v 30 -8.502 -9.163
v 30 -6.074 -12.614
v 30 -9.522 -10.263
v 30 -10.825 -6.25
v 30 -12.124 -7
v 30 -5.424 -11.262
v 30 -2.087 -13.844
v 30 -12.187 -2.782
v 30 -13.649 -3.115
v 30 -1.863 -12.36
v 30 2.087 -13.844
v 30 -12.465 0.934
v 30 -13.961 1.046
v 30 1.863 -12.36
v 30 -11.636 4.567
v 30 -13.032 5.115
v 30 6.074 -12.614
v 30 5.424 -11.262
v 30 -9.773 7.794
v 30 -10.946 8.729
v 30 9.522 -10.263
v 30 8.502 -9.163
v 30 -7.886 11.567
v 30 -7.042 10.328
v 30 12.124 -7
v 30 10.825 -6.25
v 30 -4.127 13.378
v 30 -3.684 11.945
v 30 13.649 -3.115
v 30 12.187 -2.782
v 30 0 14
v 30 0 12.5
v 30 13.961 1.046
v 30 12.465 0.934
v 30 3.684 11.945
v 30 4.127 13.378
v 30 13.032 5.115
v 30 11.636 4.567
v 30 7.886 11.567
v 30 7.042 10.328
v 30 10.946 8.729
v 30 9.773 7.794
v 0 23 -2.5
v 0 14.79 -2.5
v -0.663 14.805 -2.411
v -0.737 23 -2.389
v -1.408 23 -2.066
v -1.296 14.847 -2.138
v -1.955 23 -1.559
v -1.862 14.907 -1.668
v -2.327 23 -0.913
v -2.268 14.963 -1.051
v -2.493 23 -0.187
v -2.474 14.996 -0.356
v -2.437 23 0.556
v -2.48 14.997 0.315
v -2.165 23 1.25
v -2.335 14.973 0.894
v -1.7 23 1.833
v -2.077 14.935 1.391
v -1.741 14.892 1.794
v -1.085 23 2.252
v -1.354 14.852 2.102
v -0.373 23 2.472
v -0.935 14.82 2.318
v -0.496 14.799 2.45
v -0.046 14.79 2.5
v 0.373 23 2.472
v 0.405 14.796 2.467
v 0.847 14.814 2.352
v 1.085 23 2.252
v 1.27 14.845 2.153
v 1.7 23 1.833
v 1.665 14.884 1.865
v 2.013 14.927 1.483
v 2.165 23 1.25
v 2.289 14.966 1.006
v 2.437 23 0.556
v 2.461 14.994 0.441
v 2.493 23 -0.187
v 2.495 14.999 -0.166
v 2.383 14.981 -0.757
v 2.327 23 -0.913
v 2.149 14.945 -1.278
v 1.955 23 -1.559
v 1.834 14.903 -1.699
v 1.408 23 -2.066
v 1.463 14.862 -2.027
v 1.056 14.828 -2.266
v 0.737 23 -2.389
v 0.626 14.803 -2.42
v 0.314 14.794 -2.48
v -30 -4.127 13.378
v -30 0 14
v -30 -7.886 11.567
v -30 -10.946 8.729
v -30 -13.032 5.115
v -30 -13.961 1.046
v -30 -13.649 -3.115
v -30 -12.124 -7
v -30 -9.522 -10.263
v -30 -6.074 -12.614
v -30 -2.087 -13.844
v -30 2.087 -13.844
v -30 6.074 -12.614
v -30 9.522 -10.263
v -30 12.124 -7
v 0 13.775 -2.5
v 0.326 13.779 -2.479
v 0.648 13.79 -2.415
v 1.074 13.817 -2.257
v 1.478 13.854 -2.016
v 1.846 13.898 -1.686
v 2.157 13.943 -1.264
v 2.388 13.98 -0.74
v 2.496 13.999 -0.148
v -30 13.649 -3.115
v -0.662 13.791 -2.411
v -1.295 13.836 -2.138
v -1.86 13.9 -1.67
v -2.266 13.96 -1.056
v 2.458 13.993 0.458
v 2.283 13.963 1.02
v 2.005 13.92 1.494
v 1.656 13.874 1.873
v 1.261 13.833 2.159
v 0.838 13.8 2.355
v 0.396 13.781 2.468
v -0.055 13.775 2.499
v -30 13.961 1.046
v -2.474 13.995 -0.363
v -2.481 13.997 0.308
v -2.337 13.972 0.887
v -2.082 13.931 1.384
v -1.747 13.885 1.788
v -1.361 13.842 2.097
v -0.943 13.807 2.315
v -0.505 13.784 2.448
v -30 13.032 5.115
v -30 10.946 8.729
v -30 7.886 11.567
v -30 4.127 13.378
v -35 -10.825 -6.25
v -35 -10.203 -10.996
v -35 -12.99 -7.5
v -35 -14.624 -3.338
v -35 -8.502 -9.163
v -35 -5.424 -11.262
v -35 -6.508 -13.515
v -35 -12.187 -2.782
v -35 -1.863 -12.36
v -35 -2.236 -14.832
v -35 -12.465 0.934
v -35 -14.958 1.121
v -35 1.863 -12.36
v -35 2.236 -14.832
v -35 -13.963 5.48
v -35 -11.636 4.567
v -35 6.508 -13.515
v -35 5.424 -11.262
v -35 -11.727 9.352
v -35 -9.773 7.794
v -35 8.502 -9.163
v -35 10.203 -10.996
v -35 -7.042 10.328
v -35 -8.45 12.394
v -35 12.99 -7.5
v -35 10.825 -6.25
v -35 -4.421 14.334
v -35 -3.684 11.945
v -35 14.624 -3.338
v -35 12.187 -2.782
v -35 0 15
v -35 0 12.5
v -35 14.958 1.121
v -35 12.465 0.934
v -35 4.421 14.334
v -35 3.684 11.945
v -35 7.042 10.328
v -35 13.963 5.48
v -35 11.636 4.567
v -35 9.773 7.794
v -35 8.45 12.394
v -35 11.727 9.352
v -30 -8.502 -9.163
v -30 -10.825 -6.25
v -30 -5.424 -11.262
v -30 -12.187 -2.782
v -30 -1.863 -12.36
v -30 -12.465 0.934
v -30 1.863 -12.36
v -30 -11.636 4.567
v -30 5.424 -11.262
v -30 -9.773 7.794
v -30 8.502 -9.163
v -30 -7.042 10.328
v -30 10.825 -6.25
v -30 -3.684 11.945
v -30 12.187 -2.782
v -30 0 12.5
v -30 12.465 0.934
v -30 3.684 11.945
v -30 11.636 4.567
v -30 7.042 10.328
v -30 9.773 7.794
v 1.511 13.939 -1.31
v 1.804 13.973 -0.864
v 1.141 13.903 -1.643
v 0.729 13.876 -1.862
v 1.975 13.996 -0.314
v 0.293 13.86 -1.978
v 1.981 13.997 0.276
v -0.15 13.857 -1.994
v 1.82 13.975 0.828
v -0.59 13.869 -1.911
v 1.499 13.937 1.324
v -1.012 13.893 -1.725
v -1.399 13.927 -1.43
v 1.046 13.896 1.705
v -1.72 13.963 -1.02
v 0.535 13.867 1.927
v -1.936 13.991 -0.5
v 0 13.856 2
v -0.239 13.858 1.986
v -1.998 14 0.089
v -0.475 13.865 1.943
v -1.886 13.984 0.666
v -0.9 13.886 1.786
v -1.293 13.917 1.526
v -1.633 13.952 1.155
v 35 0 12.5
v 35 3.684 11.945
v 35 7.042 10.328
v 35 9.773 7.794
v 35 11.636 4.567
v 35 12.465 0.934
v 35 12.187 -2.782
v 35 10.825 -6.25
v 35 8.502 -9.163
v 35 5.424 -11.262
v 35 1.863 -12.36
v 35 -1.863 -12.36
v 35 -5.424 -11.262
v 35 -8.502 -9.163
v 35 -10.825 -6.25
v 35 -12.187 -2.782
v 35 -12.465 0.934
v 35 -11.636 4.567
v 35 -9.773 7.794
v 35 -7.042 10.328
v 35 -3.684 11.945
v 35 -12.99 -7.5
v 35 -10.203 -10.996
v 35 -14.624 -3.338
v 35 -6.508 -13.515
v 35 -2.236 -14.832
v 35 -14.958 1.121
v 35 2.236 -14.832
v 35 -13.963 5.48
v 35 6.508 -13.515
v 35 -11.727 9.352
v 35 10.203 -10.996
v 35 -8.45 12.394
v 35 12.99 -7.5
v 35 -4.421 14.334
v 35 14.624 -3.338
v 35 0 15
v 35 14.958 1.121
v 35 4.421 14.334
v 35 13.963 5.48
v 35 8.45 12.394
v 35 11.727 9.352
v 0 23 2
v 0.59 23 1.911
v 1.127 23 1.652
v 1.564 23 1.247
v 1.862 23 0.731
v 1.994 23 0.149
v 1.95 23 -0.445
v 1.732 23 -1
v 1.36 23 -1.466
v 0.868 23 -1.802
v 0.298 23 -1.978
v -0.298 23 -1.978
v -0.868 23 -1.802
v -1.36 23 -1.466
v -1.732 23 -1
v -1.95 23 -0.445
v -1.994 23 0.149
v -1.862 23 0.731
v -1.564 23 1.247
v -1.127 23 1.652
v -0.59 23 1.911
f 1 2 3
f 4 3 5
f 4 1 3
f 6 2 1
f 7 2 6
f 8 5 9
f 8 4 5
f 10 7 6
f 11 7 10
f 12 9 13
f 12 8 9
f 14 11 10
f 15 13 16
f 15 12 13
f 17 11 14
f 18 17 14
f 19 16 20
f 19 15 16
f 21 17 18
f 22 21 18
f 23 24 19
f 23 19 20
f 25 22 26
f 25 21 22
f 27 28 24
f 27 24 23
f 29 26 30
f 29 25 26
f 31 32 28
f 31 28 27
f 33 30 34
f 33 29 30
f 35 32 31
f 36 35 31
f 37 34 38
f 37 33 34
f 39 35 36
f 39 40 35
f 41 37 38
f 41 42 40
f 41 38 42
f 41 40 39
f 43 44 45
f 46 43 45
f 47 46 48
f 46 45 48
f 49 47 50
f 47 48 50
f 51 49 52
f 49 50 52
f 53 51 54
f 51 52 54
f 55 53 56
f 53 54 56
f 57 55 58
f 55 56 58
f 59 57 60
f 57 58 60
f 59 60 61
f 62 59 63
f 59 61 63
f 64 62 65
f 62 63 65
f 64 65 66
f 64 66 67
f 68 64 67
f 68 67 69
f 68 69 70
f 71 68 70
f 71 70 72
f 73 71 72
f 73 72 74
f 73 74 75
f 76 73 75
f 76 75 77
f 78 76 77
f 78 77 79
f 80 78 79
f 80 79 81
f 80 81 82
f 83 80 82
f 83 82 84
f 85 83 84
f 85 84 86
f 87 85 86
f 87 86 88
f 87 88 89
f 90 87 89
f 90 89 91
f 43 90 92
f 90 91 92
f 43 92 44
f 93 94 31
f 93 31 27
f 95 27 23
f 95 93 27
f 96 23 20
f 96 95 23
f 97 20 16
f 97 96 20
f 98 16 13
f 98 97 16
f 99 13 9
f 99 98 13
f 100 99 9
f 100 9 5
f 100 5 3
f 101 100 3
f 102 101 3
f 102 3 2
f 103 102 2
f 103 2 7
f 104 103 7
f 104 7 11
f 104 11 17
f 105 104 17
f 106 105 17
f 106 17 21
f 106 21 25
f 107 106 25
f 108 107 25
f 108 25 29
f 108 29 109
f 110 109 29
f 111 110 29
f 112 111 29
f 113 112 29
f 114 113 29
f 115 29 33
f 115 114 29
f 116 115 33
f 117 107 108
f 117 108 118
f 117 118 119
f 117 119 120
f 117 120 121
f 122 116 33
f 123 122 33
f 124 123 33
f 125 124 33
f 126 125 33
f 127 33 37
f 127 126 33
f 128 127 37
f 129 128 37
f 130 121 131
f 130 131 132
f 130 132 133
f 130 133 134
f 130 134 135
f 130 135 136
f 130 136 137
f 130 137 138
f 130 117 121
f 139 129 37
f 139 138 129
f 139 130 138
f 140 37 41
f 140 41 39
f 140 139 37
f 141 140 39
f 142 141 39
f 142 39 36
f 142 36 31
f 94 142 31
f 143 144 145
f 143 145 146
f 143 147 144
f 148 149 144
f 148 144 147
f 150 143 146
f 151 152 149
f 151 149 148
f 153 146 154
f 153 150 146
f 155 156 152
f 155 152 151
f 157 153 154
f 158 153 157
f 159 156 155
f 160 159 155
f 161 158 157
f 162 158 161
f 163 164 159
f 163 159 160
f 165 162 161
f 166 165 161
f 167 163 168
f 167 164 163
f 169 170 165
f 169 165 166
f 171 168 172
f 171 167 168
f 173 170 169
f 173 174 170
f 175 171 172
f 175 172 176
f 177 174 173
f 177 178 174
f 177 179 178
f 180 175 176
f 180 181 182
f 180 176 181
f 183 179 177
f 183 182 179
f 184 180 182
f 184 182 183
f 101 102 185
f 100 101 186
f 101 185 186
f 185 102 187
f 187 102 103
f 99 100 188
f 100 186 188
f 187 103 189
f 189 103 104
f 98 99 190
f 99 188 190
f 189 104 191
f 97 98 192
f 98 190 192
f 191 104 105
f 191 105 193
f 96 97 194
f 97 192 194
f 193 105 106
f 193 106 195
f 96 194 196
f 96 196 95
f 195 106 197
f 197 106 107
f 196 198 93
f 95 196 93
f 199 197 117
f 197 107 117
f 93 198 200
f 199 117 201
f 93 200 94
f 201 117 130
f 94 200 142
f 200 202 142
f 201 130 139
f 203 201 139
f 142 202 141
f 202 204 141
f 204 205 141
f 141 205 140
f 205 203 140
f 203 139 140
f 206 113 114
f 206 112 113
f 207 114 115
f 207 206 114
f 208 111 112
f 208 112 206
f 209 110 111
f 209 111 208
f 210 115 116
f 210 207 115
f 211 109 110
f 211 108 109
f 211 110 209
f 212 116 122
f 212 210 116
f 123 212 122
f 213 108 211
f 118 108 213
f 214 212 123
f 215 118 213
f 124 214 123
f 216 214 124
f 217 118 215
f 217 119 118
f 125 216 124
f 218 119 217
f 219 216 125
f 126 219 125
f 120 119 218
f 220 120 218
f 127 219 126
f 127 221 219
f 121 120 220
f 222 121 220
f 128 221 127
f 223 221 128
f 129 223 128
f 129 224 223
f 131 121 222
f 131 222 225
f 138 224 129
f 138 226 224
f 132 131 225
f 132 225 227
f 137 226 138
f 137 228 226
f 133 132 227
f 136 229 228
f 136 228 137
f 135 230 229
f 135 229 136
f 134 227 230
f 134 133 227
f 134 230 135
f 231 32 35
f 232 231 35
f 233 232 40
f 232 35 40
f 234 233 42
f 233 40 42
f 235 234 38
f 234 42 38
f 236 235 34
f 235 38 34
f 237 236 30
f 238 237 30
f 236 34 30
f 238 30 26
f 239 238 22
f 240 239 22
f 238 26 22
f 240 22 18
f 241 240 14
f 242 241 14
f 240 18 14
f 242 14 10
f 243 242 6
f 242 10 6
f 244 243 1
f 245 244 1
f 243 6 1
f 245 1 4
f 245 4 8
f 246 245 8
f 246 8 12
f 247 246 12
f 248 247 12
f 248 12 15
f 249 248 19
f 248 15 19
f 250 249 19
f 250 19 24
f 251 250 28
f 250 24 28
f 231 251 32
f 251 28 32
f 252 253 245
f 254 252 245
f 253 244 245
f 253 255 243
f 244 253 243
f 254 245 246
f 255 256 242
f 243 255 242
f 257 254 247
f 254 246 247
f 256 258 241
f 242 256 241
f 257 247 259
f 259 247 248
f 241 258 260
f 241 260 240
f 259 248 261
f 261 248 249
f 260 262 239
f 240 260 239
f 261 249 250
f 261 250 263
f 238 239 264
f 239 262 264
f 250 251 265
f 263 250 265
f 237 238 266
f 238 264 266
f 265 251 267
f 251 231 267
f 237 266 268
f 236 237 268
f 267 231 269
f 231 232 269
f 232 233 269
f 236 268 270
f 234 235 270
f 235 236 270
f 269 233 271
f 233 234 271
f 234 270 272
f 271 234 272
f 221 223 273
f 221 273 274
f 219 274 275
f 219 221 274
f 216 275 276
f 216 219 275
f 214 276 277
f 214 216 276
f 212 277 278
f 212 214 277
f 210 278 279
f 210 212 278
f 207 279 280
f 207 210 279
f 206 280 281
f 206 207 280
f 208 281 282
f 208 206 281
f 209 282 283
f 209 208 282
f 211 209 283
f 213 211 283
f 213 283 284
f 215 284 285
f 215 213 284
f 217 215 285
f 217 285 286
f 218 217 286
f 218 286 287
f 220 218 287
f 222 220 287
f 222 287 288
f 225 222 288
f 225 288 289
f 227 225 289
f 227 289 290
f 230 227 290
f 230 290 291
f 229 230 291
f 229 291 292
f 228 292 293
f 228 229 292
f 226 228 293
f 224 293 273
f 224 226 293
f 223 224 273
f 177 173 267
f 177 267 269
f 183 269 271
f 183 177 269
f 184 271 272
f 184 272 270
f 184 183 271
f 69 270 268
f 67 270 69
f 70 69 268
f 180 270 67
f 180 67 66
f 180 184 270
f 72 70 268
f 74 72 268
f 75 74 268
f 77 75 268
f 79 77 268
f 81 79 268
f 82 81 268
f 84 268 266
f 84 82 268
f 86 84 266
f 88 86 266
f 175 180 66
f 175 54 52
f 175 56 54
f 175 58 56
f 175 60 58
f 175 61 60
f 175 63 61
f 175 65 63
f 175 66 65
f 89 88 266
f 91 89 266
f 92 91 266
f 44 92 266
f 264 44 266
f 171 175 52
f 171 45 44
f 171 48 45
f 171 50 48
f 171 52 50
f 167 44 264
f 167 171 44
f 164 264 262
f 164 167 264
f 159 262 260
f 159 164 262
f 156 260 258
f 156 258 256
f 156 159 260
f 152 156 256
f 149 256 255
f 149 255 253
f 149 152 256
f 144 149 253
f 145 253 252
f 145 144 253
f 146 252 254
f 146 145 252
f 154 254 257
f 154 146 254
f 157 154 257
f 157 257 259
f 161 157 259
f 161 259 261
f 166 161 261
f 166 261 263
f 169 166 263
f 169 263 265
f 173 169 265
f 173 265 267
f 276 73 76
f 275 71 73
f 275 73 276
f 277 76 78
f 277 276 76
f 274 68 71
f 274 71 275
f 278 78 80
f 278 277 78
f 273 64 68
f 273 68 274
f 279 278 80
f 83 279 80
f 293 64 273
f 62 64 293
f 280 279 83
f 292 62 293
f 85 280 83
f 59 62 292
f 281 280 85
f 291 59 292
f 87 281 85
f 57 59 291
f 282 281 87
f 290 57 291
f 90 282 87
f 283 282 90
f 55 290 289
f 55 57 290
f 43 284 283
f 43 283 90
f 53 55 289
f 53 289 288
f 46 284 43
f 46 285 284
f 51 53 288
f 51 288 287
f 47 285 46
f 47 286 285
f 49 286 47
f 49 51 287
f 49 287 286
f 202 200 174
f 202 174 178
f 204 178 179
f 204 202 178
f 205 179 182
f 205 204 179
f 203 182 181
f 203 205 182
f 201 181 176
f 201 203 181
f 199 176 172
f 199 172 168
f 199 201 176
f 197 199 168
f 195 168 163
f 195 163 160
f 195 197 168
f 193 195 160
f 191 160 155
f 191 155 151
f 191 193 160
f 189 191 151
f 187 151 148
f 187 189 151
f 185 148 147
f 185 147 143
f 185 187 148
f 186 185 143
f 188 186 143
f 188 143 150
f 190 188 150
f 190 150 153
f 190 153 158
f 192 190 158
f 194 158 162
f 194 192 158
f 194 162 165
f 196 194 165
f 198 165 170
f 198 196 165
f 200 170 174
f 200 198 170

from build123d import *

# Parameters (mm, degrees)
SKETCH1_R           = 15
SKETCH1_R_2         = 14
BOSS_EXTRUDE1_DEPTH = 30
SKETCH2_R           = 15
SKETCH2_R_2         = 12.5
BOSS_EXTRUDE2_DEPTH = 5
SKETCH4_R           = 2.5
BOSS_EXTRUDE3_DEPTH = 23
SKETCH3_R           = 2
CUT_EXTRUDE1_DEPTH  = 35
SKETCH5_R           = 14
CUT_EXTRUDE2_DEPTH  = 53


with BuildPart() as part:
    # Sketch1 → Boss-Extrude1 (new, symmetric)
    with BuildSketch(Plane(origin=(0, 0, 0), x_dir=(0, 0, -1), z_dir=(1, 0, 0))):
        with Locations(Location((0, 0, 0), (0, 0, 180))):
            Circle(SKETCH1_R)
        with Locations(Location((0, 0, 0), (0, 0, 180))):
            Circle(SKETCH1_R_2, mode=Mode.SUBTRACT)
    extrude(amount=BOSS_EXTRUDE1_DEPTH, both=True)

    # Sketch2 → Boss-Extrude2 (add)
    with BuildSketch(Plane.ZY.offset(30)):
        Circle(SKETCH2_R)
        Circle(SKETCH2_R_2, mode=Mode.SUBTRACT)
    boss_extrude2 = extrude(amount=BOSS_EXTRUDE2_DEPTH)

    # Mirror1: Boss-Extrude2 across plane
    add(boss_extrude2.mirror(Plane(origin=(0, 0, 0), x_dir=(0, 0, 1), z_dir=(1, 0, 0))))

    # Sketch4 → Boss-Extrude3 (add)
    with BuildSketch(Plane(origin=(0, 0, 0), x_dir=(1, 0, 0), z_dir=(0, 1, 0))):
        with Locations(Location((0, 0, 0), (0, 0, 90))):
            Circle(SKETCH4_R)
    extrude(amount=BOSS_EXTRUDE3_DEPTH)

    # Sketch3 → Cut-Extrude1 (cut)
    with BuildSketch(Plane(origin=(0, 0, 0), x_dir=(1, 0, 0), z_dir=(0, 1, 0))):
        with Locations(Location((0, 0, 0), (0, 0, 270))):
            Circle(SKETCH3_R)
    extrude(amount=CUT_EXTRUDE1_DEPTH, mode=Mode.SUBTRACT)

    # Sketch5 → Cut-Extrude2 (cut)
    with BuildSketch(Plane(origin=(-30, 0, 0), x_dir=(0, 0, -1), z_dir=(1, 0, 0))):
        Circle(SKETCH5_R)
    extrude(amount=CUT_EXTRUDE2_DEPTH, mode=Mode.SUBTRACT)


solid = part.part
